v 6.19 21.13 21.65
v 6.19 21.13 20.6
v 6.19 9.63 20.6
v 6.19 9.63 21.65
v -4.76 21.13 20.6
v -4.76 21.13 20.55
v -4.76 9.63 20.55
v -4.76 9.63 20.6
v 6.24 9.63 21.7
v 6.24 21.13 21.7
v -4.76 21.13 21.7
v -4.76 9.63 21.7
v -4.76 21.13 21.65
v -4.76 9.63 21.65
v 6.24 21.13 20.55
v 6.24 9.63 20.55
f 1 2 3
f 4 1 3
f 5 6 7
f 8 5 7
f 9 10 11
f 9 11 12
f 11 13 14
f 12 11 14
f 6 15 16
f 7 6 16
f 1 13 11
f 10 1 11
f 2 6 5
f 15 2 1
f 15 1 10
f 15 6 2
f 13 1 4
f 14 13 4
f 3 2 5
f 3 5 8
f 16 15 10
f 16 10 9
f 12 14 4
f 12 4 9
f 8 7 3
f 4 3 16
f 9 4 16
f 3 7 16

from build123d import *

# Parameters (mm, degrees)
BOX077_W               = 11.5
BOX077_H               = 10.95
BOX077_DEPTH           = 1.05
BOX076_W               = 11.5
BOX076_H               = 11
BOX076_DEPTH           = 1.15
CUT024_PLACEMENT_ANGLE = 270


with BuildPart() as small_cu_gnd_electrode022:
    # Box077 → Box077 (new body)
    with BuildSketch(Plane.XY.offset(0.05)):
        with Locations((5.75, 5.475)):
            Rectangle(BOX077_W, BOX077_H)
    extrude(amount=BOX077_DEPTH)


with BuildPart() as large_cu_electrode_short_axis_gnd002:
    # Box076 → Box076 (new body)
    with BuildSketch(Plane.XY):
        with Locations((5.75, 5.5)):
            Rectangle(BOX076_W, BOX076_H)
    extrude(amount=BOX076_DEPTH)

    # Cut024: cut Small Cu GND Electrode022
    add(small_cu_gnd_electrode022.part, mode=Mode.SUBTRACT)


with BuildPart() as large_cu_electrode_short_axis_gnd002_1:
    # Cut024 placement: moved
    add(large_cu_electrode_short_axis_gnd002.part.moved(Location((-4.76, 21.13, 20.55))).rotate(Axis((-4.76, 21.13, 20.55), (0, 0, 1)), CUT024_PLACEMENT_ANGLE))


solid = large_cu_electrode_short_axis_gnd002_1.part
